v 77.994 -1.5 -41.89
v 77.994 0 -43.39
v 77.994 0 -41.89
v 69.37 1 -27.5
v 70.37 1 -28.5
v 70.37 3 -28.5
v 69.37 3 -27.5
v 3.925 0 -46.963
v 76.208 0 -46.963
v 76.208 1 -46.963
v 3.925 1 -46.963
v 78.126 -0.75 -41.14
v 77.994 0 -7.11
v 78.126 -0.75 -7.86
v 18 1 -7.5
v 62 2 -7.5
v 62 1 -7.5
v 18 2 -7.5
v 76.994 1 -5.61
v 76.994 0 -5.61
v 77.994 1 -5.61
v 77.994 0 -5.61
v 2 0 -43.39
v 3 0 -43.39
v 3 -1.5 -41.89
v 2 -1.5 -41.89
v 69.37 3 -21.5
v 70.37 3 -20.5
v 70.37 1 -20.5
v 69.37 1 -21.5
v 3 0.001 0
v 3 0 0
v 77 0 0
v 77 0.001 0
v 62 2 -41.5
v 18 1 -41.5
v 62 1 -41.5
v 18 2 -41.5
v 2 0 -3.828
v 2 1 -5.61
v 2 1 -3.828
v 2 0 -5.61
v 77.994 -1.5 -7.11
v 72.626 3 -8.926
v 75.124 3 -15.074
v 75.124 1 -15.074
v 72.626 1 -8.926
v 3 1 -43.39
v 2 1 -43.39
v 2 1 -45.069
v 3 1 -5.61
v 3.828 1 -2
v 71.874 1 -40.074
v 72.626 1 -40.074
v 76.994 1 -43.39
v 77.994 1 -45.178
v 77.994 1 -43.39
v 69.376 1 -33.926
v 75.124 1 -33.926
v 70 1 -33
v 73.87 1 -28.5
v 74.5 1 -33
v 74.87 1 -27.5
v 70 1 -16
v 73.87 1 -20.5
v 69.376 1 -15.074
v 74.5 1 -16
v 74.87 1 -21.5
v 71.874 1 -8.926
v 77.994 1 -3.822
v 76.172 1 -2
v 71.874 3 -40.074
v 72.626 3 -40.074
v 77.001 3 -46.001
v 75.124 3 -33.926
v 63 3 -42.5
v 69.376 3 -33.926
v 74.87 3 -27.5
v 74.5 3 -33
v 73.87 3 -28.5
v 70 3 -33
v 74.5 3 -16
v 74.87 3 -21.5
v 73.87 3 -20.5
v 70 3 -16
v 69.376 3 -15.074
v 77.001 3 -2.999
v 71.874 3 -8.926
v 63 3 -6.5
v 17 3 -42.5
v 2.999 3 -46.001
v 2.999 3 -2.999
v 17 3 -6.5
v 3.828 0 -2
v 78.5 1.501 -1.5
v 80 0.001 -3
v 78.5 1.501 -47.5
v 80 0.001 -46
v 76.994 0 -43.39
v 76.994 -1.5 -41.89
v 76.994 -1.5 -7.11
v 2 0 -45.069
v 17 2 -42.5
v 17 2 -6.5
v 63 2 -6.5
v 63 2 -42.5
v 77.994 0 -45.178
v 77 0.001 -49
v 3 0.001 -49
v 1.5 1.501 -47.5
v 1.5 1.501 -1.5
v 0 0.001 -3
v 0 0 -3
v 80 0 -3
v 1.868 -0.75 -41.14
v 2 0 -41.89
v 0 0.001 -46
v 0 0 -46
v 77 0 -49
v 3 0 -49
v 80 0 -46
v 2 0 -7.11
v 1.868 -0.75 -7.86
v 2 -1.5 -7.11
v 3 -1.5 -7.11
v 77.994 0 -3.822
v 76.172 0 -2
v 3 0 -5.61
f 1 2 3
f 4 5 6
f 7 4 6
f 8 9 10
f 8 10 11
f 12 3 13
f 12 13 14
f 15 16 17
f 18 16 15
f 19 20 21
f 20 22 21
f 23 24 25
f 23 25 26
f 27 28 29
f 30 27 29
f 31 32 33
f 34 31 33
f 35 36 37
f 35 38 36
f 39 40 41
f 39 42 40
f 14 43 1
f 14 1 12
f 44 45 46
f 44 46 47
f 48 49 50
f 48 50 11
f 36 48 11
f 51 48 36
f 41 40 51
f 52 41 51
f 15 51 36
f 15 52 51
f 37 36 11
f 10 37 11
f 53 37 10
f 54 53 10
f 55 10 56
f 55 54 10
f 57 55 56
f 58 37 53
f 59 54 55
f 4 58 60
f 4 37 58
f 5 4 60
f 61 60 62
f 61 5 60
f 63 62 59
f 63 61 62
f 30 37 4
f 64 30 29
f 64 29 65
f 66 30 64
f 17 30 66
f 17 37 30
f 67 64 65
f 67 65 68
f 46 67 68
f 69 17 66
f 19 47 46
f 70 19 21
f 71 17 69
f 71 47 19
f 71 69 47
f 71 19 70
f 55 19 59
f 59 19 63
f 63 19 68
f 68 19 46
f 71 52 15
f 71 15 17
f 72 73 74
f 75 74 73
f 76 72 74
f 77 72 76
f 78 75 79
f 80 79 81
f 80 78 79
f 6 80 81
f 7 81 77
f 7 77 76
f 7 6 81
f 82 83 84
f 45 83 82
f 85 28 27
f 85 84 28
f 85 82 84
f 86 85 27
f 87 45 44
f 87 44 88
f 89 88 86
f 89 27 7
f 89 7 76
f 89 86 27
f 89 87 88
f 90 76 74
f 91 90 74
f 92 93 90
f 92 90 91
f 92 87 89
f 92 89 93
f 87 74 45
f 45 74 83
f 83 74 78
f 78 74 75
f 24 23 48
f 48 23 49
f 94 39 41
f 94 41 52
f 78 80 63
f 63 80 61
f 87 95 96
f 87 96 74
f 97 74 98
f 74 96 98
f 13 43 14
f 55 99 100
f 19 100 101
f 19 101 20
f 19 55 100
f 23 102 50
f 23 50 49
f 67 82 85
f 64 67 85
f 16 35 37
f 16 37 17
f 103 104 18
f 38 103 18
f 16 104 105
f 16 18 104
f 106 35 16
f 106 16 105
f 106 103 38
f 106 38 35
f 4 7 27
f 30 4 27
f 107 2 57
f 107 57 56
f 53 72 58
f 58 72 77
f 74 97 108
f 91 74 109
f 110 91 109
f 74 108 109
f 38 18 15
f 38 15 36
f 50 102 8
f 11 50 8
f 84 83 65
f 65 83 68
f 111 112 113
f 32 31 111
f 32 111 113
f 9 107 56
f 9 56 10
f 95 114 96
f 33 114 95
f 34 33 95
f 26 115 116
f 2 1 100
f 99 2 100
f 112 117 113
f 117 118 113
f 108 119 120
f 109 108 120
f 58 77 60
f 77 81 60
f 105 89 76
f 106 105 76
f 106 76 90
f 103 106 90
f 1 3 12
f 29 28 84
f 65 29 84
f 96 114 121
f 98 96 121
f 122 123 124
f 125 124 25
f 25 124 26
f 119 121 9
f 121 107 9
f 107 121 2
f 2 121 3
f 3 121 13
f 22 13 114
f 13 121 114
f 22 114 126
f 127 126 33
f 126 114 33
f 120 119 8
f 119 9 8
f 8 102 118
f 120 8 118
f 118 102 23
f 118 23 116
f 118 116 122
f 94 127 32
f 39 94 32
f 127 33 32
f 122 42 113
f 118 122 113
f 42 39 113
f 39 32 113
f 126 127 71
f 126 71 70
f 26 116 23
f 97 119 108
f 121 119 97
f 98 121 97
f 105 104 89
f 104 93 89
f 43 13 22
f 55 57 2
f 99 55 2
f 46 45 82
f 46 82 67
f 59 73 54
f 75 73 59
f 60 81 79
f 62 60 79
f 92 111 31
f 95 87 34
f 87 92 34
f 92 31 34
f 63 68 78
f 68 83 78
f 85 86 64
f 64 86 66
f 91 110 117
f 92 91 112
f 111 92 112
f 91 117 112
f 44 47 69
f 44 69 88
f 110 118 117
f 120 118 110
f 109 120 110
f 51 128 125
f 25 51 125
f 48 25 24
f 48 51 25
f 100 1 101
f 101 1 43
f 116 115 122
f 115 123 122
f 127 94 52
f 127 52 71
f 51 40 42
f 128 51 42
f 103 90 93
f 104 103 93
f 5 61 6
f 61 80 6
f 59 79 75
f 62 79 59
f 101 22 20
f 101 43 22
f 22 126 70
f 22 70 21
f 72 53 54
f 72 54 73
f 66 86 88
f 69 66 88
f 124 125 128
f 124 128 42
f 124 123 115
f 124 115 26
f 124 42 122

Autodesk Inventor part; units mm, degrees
ref_plane "YZ Plane" through (0, 0, 0) normal (1, 0, 0) x (0, 1, 0)
ref_plane "XZ Plane" through (0, 0, 0) normal (0, 1, 0) x (-1, 0, 0)
sketch "Náčrt1" plane through (0, 0, 0) normal (0, 1, 0) x (-1, 0, 0)
  line L0 (0, 0) -> (-80, 0)
  line L1 (-80, 0) -> (-80, -49)
  line L2 (-80, -49) -> (0, -49)
  line L3 (0, -49) -> (0, 0)
  dimension "d0" = 80
  dimension "d1" = 49
extrude "Vysunutí1" add sketch "Náčrt1" along normal blind 3
chamfer "Zkosení1" distance 3 angle 45 4 edges at (0, 1.5, 0) (0, 1.5, -49) (80, 1.5, -49) (80, 1.5, 0)
chamfer "Zkosení2" distance 3 angle 45 4 edges at (40, 3, 0) (0, 3, -24.5) (40, 3, -49) (80, 3, -24.5)
sketch "Náčrt2" plane through (0, 3, 0) normal (0, 1, 0) x (1, 0, 0)
  line L0 (18, 41.5) -> (62, 41.5)
  line L1 (62, 41.5) -> (62, 7.5)
  line L2 (62, 7.5) -> (18, 7.5)
  line L3 (18, 7.5) -> (18, 41.5)
  line L4 (77, 49) -> (3, 49) projected
  line L5 (0, 46) -> (0, 3) projected
  point P0 (0, 0)
  dimension "d11" = 44
  dimension "d12" = 34
  dimension "d13" = 7.5
  dimension "d14" = 18
extrude "Vysunutí2" cut sketch "Náčrt2" against normal blind 2.5
sketch "Náčrt3" plane through (0, 3, 0) normal (0, 1, 0) x (1, 0, 0)
  line L0 (63, 42.5) -> (17, 42.5)
  line L1 (17, 42.5) -> (17, 6.5)
  line L2 (17, 6.5) -> (63, 6.5)
  line L3 (63, 6.5) -> (63, 42.5)
  line L4 (63, 42.5) -> (17, 6.5) construction
  line L5 (17, 42.5) -> (63, 6.5) construction
  point P0 (0, 0)
  point P1 (40, 24.5)
  dimension "d17" = 46
  dimension "d18" = 36
extrude "Vysunutí3" cut sketch "Náčrt3" against normal blind 1
sketch "Náčrt4" plane through (0, 3, 0) normal (0, 1, 0) x (1, 0, 0)
  line L0 (75.5, 16) -> (69, 16)
  line L1 (69, 16) -> (72.25, 8)
  line L2 (75.5, 16) -> (72.25, 8)
  line L3 (3, 0) -> (77, 0) projected
  line L4 (0, 46) -> (0, 3) projected
  point P0 (0, 0)
  dimension "d21" = 6.5
extrude "Vysunutí4" cut sketch "Náčrt4" against normal blind 2.5
chamfer "Zkosení3" distance 1 angle 45 3 edges at (69, 1.75, -16) (75.5, 1.75, -16) (72.25, 1.75, -8)
ref_plane "Pracovní rovina1" through (77, 0, -24.5) normal (0, 0, -1) x (-1, 0, 0)
mirror "Zrcadlit1" about plane through (77, 0, -24.5) normal (0, 0, -1) of "Vysunutí4", "Zkosení3"
sketch "Náčrt5" plane through (0, 3, 0) normal (0, 1, 0) x (1, 0, 0)
  line L0 (69.3705, 20.5) -> (74.8705, 20.5)
  line L1 (74.8705, 20.5) -> (74.8705, 28.5)
  line L2 (74.8705, 28.5) -> (69.3705, 28.5)
  line L3 (69.3705, 28.5) -> (69.3705, 20.5)
  line L4 (3, 0) -> (77, 0) projected
  point P0 (0, 0)
  dimension "d30" = 5.5
  dimension "d31" = 8
  dimension "d32" = 20.5
extrude "Vysunutí5" cut sketch "Náčrt5" against normal blind 2.5
chamfer "Zkosení4" distance 1 angle 45 4 edges at (69.3705, 1.75, -28.5) (69.3705, 1.75, -20.5) (74.8705, 1.75, -20.5) (74.8705, 1.75, -28.5)
sketch "Náčrt6" plane through (0, 3, 0) normal (0, 1, 0) x (1, 0, 0)
  point P0 (0, 0)
sketch "Náčrt7" plane through (0, 0, 0) normal (0, -1, 0) x (1, 0, 0)
  line L0 (3.8284, -2) -> (76.1716, -2)
  line L1 (77.9939, -3.8223) -> (77.9939, -45.1777)
  line L2 (76.2085, -46.9631) -> (3.9251, -46.9631)
  line L3 (2, -46) -> (2, -3.8284)
  line L4 (3, 0) -> (77, 0) projected
  line L5 (0, -46) -> (0, -3) projected
  line L6 (0, -46) -> (2.8284, -46) construction
  line L7 (2, -45.0688) -> (3.9251, -46.9631)
  line L8 (3, -49) -> (0, -46) projected
  line L9 (80, -46) -> (77, -49) projected
  line L10 (80, -46) -> (82.8284, -46) construction
  line L11 (77.9939, -45.1777) -> (76.2085, -46.9631)
  line L12 (77, 0) -> (80, -3) projected
  line L13 (76.1716, -2) -> (77.9939, -3.8223)
  line L14 (2, -3.8284) -> (3.8284, -2)
  line L15 (0, -3) -> (3, 0) projected
  point P0 (0, 0)
  dimension "d40" = 2
  dimension "d41" = 2
  dimension "d43" = 2
  dimension "d45" = 2
  dimension "d46" = 2
  dimension "d47" = 2
extrude "Vysunutí6" cut sketch "Náčrt7" against normal blind 1
sketch "Náčrt8" plane through (77.9939, 0, -45.1777) normal (-1, 0, 0) x (0, 0, 1)
  line L0 (1.7879, 1) -> (1.7879, -1.5)
  line L1 (1.7879, -1.5) -> (39.5674, -1.5)
  line L2 (39.5674, -1.5) -> (39.5674, 1)
  line L3 (41.3554, 1) -> (0, 1) projected
  line L4 (39.5674, 1) -> (1.7879, 1)
  point P0 (45.1777, 0)
extrude "Vysunutí7" add sketch "Náčrt8" along normal blind 1
chamfer "Zkosení5" distance 1.5 angle 45 2 edges at (77.4939, -1.5, -5.6103) (77.4939, -1.5, -43.3897)
sketch "Náčrt9" plane through (77.9939, 0, -45.1777) normal (1, 0, 0) x (0, 0, -1)
  line L0 (-3.2879, -1.5) -> (-3.2879, 0)
  line L1 (-3.2879, -1.5) -> (-38.0674, -1.5) projected
  line L2 (-3.2879, -1.5) -> (-38.0674, -1.5)
  line L3 (-38.0674, -1.5) -> (-38.0674, 0)
  line L4 (-42.1777, 0) -> (0.8223, 0) projected
  point P0 (-45.1777, 0)
  point P1 (-1.7879, 0)
extrude "Vysunutí8" add sketch "Náčrt9" along normal blind 0.5 draft -80
ref_plane "Pracovní rovina2" through (39.9969, 0, -45.1777) normal (-1, 0, 0) x (0, 0, 1)
mirror "Zrcadlit2" about plane through (39.9969, 0, -45.1777) normal (-1, 0, 0) of "Vysunutí7", "Zkosení5", "Vysunutí8"
properties part number "TopCover"
